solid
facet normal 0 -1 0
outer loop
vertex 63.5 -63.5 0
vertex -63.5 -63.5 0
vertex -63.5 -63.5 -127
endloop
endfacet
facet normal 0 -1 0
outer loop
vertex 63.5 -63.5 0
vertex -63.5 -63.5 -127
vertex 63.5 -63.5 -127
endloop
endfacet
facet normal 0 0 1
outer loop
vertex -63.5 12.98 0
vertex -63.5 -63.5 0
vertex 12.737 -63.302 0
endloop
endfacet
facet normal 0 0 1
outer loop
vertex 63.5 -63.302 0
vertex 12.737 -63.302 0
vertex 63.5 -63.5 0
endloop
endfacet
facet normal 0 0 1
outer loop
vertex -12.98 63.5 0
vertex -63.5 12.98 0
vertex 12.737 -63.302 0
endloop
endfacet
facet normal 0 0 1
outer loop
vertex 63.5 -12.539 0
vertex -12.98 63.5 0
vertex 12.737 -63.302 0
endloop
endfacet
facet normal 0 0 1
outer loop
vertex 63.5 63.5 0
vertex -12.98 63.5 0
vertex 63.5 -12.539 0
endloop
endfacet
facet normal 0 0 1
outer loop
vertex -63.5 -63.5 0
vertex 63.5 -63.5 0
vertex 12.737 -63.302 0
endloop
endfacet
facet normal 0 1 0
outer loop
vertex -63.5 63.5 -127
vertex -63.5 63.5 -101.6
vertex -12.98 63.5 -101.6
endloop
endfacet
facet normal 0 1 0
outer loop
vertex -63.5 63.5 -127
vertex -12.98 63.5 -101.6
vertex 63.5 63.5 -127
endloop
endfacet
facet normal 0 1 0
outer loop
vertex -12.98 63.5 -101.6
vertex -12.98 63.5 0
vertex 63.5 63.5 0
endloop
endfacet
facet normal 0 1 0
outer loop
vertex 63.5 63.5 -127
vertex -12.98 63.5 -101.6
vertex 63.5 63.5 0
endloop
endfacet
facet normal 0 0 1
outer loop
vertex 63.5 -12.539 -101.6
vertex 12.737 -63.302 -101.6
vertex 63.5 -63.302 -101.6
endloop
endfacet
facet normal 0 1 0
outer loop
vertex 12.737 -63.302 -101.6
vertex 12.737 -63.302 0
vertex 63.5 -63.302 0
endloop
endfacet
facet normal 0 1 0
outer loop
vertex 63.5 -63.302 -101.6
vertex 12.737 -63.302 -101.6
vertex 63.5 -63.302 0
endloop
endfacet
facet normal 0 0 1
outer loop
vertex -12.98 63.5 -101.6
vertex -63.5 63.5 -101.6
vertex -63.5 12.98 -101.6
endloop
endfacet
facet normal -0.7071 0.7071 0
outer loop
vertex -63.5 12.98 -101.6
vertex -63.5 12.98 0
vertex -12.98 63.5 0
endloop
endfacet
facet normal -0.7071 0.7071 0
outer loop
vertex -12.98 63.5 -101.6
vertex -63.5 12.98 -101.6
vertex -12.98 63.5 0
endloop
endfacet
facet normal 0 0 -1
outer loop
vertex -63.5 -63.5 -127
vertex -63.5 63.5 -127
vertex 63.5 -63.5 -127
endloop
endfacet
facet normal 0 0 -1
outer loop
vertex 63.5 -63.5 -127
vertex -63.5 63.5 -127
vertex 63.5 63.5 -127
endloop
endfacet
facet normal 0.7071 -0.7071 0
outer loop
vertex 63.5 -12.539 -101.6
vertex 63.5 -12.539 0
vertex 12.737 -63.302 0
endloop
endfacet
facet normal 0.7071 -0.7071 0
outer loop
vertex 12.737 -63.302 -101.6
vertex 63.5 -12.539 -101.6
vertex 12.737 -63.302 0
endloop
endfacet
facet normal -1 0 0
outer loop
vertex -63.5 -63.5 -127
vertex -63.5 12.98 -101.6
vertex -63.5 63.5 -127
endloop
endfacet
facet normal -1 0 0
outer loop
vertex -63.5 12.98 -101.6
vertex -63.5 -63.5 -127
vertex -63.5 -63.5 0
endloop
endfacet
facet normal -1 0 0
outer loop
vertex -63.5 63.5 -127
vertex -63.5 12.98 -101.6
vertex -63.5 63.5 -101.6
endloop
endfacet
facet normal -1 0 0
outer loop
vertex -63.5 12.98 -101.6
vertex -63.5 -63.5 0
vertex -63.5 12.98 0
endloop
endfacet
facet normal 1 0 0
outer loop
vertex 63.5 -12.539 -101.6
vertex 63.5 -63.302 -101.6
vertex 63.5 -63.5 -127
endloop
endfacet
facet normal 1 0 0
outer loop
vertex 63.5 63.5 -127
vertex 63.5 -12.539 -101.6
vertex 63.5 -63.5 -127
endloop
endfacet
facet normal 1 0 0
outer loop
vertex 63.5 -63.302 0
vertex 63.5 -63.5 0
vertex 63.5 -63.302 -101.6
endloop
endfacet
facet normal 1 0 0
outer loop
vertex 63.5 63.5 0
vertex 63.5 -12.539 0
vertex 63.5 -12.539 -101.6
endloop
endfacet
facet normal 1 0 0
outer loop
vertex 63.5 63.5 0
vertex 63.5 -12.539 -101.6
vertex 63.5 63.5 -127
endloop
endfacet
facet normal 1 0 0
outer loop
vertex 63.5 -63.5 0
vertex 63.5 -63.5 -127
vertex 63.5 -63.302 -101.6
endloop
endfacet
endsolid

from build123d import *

# Parameters (mm, degrees)
F0_W     = 127
F0_H     = 127
F1_DEPTH = 127
F3_DEPTH = 101.6


# Not quite as in the source:
# - a feature names something its author has since deleted; it is built from what else it names


with BuildPart() as f1:
    # F0 (on Top) → F1 (new body)
    with BuildSketch(Plane.XY):
        Rectangle(F0_W, F0_H)
    extrude(amount=-F1_DEPTH)

    # F2 (on Top) → F3 (cut)
    with BuildSketch(Plane.XY):
        Polygon((-12.9577365428, 63.5224819239), (-63.7577365428, 63.5224819239), (-63.7577365428, 12.7224819239), align=None)
        Polygon((12.7373517871, -63.3020326495), (63.5373517871, -63.3020326495), (63.5373517871, -12.5020326495), align=None)
    extrude(amount=-F3_DEPTH, mode=Mode.SUBTRACT)


solid = f1.part
